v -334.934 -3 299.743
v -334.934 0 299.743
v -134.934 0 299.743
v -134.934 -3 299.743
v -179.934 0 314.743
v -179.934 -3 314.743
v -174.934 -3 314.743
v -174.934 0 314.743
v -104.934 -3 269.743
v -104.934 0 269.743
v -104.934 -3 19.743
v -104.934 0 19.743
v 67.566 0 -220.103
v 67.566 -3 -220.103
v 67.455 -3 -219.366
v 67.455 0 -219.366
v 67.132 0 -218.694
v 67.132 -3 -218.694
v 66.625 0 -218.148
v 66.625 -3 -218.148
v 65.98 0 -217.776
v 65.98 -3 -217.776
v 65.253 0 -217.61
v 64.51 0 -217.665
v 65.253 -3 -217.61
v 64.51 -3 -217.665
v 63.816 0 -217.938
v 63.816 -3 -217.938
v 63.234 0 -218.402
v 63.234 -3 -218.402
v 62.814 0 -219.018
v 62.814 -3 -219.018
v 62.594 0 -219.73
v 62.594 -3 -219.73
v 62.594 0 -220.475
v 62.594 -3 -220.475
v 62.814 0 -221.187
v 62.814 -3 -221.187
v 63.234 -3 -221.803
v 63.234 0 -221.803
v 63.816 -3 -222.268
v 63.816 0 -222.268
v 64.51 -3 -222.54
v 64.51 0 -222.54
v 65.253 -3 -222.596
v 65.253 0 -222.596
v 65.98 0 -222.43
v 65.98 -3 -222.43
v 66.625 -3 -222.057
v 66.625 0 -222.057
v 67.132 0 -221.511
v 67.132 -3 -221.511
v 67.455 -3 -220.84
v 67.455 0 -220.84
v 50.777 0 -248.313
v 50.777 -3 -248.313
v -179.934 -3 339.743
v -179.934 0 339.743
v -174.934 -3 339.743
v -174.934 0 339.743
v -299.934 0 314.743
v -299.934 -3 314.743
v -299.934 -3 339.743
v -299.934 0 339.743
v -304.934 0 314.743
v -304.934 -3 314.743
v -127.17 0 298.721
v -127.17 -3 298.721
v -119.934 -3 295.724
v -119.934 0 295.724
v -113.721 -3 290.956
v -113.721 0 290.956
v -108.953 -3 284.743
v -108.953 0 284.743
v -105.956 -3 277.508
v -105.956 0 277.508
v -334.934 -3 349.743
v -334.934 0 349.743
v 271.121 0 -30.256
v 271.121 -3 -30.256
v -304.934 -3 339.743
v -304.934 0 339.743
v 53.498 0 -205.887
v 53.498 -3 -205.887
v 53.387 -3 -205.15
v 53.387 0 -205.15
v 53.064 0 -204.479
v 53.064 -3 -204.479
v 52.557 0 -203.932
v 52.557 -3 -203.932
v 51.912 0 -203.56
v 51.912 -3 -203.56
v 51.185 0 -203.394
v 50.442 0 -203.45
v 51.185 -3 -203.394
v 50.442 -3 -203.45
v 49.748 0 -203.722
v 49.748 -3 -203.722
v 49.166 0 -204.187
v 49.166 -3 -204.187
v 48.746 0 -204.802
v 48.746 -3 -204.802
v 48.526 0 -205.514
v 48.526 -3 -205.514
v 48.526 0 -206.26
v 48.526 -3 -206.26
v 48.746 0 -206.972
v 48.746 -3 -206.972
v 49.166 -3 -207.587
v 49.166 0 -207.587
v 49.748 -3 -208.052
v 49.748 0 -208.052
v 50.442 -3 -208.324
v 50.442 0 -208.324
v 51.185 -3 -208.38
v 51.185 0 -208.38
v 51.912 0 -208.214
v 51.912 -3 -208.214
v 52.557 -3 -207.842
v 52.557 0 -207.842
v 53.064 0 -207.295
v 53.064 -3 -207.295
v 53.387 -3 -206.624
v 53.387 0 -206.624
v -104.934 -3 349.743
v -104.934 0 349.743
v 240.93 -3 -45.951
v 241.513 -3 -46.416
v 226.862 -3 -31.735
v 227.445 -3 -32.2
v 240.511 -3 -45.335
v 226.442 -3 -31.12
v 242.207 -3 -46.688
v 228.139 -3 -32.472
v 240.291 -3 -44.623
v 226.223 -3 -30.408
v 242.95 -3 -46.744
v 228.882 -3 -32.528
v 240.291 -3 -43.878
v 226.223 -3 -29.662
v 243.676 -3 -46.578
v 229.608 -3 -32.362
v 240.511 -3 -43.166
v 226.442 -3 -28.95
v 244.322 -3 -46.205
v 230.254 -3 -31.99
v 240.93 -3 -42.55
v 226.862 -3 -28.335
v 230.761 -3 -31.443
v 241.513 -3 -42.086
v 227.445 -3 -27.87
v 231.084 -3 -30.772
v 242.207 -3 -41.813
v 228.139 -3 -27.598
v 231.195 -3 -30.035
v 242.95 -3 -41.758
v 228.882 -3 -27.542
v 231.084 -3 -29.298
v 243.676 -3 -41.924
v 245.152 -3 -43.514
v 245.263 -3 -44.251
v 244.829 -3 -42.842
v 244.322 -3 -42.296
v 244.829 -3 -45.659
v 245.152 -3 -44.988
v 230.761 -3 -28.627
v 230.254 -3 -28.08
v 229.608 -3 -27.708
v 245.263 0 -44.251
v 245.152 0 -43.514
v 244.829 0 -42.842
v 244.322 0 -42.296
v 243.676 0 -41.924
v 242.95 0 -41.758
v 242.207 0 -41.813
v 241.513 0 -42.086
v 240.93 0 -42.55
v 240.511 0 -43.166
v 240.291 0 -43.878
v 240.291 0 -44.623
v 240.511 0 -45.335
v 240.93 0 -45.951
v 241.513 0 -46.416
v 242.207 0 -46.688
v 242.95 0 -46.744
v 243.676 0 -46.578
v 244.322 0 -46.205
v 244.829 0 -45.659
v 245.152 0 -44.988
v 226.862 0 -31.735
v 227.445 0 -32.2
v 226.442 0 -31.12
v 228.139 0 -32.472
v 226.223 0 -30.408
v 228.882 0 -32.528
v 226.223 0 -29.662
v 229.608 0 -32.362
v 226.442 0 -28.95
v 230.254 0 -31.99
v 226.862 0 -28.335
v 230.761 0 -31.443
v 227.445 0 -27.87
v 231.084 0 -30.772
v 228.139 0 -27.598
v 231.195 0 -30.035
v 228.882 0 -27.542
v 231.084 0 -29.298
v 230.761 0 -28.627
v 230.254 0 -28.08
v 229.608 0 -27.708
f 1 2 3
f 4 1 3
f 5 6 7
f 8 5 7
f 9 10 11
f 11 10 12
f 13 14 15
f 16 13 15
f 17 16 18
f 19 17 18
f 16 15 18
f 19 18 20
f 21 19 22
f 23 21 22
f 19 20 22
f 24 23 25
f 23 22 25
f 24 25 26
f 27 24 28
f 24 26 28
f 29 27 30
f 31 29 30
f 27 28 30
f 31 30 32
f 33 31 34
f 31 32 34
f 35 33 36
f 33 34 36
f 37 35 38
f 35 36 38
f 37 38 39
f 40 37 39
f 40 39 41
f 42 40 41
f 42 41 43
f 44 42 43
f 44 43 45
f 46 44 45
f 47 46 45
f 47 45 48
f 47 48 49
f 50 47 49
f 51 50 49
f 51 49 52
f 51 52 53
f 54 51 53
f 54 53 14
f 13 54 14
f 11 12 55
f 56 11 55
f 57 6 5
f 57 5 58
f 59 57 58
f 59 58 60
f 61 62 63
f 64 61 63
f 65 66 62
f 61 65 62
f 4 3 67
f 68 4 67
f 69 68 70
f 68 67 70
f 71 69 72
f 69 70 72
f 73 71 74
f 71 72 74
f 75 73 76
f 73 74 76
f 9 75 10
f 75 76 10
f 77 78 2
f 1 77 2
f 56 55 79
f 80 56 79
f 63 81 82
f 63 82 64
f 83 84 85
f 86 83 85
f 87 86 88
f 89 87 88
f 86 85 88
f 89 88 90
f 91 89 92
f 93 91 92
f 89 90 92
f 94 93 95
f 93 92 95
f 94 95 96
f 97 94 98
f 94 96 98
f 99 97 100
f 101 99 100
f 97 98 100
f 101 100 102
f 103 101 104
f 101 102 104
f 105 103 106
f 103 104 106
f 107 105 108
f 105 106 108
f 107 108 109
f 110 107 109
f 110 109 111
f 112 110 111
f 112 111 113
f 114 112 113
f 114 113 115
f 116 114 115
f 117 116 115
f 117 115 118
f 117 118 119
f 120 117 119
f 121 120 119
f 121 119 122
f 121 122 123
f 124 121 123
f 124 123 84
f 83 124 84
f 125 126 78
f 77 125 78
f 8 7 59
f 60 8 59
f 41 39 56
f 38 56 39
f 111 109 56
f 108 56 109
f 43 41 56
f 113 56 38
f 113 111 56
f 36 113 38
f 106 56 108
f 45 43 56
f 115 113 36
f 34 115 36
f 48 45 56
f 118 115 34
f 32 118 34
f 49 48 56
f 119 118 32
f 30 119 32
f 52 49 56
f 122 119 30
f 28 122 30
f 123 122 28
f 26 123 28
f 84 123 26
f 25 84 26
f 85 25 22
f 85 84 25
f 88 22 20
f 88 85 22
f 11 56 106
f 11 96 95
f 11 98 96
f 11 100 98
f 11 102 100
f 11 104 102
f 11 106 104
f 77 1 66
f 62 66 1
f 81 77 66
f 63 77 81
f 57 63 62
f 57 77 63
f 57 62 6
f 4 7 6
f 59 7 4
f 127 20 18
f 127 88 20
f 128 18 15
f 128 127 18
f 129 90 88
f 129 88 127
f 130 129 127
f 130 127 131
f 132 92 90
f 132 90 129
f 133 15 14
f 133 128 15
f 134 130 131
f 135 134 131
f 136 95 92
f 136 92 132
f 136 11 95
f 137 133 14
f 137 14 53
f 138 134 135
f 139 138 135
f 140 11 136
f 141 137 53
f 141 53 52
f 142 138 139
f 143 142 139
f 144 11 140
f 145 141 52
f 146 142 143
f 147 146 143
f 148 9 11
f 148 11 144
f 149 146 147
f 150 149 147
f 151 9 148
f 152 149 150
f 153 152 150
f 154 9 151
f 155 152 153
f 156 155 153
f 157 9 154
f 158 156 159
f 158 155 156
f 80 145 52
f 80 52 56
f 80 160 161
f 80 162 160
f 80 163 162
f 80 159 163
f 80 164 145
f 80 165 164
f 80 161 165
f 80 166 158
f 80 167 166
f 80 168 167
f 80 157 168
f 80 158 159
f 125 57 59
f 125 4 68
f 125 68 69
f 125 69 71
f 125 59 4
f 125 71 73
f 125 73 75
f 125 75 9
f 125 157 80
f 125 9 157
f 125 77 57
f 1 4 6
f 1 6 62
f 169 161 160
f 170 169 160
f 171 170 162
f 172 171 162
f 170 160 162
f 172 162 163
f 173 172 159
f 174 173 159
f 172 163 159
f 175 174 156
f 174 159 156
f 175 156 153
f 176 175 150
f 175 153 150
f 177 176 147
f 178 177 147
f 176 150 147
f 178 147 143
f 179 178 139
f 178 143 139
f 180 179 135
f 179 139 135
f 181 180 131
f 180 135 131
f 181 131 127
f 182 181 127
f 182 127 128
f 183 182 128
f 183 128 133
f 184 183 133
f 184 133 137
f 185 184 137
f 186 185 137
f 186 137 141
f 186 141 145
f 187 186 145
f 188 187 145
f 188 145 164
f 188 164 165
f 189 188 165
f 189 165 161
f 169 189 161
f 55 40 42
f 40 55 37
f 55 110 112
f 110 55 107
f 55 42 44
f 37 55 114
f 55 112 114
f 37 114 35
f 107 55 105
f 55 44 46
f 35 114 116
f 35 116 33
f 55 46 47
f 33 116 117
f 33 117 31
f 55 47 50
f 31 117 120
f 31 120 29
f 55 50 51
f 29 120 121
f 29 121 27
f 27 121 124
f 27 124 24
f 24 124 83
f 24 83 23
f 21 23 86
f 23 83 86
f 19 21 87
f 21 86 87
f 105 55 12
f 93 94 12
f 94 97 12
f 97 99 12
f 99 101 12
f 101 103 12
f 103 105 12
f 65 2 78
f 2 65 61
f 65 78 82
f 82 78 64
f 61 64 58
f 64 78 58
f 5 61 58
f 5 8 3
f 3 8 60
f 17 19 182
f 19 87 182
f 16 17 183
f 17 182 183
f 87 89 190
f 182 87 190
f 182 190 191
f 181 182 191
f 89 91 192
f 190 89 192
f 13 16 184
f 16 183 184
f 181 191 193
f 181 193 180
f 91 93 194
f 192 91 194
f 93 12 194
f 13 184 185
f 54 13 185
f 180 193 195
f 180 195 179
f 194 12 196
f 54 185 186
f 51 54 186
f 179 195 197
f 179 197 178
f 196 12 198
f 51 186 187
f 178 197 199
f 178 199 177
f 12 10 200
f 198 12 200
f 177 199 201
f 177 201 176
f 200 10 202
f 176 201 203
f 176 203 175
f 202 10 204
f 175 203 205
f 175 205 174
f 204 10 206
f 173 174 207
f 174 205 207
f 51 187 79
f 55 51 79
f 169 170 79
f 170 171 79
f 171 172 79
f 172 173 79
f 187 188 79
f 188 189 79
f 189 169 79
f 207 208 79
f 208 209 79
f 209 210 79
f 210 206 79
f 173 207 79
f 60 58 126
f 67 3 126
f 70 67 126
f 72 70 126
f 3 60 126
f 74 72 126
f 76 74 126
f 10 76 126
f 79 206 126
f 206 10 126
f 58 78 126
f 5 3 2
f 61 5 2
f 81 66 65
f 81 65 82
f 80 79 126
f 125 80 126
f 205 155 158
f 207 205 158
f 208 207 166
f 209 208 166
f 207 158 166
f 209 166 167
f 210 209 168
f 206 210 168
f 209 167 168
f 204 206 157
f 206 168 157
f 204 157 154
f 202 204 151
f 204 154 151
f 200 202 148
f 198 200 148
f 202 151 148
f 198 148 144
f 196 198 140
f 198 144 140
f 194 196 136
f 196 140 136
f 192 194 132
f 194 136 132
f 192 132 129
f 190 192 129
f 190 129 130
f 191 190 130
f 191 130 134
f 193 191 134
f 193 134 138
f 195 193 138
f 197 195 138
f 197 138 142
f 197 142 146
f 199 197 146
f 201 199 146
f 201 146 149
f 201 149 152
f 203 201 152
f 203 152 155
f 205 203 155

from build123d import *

# Parameters (mm, degrees)
F1_DEPTH = 3
F2_W     = 5
F2_H     = 25
F3_DEPTH = 3.001
F4_R     = 2.5
F5_DEPTH = 3.001


with BuildPart() as f1:
    # F0 (on Front) → F1 (new body)
    with BuildSketch(Plane.XZ):
        with BuildLine():
            Line((-104.934193, 349.7432), (-334.934193, 349.7432))
            Line((-334.934193, 349.7432), (-334.934193, 299.7432))
            Line((-334.934193, 299.7432), (-134.934193, 299.7432))
            ThreePointArc((-134.934193, 299.7432), (-113.720989, 290.956403), (-104.934193, 269.7432))
            Line((-104.934193, 269.7432), (-104.934193, 19.7432))
            Line((-104.934193, 19.7432), (50.776976, -248.312824))
            Line((50.776976, -248.312824), (271.120743, -30.256354))
            Line((271.120743, -30.256354), (-104.934193, 349.7432))
        make_face()
    extrude(amount=F1_DEPTH)

    # F2 (on face) → F3 (cut, through all)
    with BuildSketch(Plane.XZ.offset(3)):
        with Locations((-302.434193, 327.2432)):
            Rectangle(F2_W, F2_H)
        with Locations((-177.434193, 327.2432)):
            Rectangle(F2_W, F2_H)
    extrude(amount=-F3_DEPTH, mode=Mode.SUBTRACT)

    # F4 (on face) → F5 (cut, through all)
    with BuildSketch(Plane.XZ.offset(3)):
        with Locations((228.694914, -30.035003)):
            Circle(F4_R)
        with Locations((242.763073, -44.25073)):
            Circle(F4_R)
        with Locations((50.998327, -205.886995)):
            Circle(F4_R)
        with Locations((65.066486, -220.102722)):
            Circle(F4_R)
    extrude(amount=-F5_DEPTH, mode=Mode.SUBTRACT)


solid = f1.part
